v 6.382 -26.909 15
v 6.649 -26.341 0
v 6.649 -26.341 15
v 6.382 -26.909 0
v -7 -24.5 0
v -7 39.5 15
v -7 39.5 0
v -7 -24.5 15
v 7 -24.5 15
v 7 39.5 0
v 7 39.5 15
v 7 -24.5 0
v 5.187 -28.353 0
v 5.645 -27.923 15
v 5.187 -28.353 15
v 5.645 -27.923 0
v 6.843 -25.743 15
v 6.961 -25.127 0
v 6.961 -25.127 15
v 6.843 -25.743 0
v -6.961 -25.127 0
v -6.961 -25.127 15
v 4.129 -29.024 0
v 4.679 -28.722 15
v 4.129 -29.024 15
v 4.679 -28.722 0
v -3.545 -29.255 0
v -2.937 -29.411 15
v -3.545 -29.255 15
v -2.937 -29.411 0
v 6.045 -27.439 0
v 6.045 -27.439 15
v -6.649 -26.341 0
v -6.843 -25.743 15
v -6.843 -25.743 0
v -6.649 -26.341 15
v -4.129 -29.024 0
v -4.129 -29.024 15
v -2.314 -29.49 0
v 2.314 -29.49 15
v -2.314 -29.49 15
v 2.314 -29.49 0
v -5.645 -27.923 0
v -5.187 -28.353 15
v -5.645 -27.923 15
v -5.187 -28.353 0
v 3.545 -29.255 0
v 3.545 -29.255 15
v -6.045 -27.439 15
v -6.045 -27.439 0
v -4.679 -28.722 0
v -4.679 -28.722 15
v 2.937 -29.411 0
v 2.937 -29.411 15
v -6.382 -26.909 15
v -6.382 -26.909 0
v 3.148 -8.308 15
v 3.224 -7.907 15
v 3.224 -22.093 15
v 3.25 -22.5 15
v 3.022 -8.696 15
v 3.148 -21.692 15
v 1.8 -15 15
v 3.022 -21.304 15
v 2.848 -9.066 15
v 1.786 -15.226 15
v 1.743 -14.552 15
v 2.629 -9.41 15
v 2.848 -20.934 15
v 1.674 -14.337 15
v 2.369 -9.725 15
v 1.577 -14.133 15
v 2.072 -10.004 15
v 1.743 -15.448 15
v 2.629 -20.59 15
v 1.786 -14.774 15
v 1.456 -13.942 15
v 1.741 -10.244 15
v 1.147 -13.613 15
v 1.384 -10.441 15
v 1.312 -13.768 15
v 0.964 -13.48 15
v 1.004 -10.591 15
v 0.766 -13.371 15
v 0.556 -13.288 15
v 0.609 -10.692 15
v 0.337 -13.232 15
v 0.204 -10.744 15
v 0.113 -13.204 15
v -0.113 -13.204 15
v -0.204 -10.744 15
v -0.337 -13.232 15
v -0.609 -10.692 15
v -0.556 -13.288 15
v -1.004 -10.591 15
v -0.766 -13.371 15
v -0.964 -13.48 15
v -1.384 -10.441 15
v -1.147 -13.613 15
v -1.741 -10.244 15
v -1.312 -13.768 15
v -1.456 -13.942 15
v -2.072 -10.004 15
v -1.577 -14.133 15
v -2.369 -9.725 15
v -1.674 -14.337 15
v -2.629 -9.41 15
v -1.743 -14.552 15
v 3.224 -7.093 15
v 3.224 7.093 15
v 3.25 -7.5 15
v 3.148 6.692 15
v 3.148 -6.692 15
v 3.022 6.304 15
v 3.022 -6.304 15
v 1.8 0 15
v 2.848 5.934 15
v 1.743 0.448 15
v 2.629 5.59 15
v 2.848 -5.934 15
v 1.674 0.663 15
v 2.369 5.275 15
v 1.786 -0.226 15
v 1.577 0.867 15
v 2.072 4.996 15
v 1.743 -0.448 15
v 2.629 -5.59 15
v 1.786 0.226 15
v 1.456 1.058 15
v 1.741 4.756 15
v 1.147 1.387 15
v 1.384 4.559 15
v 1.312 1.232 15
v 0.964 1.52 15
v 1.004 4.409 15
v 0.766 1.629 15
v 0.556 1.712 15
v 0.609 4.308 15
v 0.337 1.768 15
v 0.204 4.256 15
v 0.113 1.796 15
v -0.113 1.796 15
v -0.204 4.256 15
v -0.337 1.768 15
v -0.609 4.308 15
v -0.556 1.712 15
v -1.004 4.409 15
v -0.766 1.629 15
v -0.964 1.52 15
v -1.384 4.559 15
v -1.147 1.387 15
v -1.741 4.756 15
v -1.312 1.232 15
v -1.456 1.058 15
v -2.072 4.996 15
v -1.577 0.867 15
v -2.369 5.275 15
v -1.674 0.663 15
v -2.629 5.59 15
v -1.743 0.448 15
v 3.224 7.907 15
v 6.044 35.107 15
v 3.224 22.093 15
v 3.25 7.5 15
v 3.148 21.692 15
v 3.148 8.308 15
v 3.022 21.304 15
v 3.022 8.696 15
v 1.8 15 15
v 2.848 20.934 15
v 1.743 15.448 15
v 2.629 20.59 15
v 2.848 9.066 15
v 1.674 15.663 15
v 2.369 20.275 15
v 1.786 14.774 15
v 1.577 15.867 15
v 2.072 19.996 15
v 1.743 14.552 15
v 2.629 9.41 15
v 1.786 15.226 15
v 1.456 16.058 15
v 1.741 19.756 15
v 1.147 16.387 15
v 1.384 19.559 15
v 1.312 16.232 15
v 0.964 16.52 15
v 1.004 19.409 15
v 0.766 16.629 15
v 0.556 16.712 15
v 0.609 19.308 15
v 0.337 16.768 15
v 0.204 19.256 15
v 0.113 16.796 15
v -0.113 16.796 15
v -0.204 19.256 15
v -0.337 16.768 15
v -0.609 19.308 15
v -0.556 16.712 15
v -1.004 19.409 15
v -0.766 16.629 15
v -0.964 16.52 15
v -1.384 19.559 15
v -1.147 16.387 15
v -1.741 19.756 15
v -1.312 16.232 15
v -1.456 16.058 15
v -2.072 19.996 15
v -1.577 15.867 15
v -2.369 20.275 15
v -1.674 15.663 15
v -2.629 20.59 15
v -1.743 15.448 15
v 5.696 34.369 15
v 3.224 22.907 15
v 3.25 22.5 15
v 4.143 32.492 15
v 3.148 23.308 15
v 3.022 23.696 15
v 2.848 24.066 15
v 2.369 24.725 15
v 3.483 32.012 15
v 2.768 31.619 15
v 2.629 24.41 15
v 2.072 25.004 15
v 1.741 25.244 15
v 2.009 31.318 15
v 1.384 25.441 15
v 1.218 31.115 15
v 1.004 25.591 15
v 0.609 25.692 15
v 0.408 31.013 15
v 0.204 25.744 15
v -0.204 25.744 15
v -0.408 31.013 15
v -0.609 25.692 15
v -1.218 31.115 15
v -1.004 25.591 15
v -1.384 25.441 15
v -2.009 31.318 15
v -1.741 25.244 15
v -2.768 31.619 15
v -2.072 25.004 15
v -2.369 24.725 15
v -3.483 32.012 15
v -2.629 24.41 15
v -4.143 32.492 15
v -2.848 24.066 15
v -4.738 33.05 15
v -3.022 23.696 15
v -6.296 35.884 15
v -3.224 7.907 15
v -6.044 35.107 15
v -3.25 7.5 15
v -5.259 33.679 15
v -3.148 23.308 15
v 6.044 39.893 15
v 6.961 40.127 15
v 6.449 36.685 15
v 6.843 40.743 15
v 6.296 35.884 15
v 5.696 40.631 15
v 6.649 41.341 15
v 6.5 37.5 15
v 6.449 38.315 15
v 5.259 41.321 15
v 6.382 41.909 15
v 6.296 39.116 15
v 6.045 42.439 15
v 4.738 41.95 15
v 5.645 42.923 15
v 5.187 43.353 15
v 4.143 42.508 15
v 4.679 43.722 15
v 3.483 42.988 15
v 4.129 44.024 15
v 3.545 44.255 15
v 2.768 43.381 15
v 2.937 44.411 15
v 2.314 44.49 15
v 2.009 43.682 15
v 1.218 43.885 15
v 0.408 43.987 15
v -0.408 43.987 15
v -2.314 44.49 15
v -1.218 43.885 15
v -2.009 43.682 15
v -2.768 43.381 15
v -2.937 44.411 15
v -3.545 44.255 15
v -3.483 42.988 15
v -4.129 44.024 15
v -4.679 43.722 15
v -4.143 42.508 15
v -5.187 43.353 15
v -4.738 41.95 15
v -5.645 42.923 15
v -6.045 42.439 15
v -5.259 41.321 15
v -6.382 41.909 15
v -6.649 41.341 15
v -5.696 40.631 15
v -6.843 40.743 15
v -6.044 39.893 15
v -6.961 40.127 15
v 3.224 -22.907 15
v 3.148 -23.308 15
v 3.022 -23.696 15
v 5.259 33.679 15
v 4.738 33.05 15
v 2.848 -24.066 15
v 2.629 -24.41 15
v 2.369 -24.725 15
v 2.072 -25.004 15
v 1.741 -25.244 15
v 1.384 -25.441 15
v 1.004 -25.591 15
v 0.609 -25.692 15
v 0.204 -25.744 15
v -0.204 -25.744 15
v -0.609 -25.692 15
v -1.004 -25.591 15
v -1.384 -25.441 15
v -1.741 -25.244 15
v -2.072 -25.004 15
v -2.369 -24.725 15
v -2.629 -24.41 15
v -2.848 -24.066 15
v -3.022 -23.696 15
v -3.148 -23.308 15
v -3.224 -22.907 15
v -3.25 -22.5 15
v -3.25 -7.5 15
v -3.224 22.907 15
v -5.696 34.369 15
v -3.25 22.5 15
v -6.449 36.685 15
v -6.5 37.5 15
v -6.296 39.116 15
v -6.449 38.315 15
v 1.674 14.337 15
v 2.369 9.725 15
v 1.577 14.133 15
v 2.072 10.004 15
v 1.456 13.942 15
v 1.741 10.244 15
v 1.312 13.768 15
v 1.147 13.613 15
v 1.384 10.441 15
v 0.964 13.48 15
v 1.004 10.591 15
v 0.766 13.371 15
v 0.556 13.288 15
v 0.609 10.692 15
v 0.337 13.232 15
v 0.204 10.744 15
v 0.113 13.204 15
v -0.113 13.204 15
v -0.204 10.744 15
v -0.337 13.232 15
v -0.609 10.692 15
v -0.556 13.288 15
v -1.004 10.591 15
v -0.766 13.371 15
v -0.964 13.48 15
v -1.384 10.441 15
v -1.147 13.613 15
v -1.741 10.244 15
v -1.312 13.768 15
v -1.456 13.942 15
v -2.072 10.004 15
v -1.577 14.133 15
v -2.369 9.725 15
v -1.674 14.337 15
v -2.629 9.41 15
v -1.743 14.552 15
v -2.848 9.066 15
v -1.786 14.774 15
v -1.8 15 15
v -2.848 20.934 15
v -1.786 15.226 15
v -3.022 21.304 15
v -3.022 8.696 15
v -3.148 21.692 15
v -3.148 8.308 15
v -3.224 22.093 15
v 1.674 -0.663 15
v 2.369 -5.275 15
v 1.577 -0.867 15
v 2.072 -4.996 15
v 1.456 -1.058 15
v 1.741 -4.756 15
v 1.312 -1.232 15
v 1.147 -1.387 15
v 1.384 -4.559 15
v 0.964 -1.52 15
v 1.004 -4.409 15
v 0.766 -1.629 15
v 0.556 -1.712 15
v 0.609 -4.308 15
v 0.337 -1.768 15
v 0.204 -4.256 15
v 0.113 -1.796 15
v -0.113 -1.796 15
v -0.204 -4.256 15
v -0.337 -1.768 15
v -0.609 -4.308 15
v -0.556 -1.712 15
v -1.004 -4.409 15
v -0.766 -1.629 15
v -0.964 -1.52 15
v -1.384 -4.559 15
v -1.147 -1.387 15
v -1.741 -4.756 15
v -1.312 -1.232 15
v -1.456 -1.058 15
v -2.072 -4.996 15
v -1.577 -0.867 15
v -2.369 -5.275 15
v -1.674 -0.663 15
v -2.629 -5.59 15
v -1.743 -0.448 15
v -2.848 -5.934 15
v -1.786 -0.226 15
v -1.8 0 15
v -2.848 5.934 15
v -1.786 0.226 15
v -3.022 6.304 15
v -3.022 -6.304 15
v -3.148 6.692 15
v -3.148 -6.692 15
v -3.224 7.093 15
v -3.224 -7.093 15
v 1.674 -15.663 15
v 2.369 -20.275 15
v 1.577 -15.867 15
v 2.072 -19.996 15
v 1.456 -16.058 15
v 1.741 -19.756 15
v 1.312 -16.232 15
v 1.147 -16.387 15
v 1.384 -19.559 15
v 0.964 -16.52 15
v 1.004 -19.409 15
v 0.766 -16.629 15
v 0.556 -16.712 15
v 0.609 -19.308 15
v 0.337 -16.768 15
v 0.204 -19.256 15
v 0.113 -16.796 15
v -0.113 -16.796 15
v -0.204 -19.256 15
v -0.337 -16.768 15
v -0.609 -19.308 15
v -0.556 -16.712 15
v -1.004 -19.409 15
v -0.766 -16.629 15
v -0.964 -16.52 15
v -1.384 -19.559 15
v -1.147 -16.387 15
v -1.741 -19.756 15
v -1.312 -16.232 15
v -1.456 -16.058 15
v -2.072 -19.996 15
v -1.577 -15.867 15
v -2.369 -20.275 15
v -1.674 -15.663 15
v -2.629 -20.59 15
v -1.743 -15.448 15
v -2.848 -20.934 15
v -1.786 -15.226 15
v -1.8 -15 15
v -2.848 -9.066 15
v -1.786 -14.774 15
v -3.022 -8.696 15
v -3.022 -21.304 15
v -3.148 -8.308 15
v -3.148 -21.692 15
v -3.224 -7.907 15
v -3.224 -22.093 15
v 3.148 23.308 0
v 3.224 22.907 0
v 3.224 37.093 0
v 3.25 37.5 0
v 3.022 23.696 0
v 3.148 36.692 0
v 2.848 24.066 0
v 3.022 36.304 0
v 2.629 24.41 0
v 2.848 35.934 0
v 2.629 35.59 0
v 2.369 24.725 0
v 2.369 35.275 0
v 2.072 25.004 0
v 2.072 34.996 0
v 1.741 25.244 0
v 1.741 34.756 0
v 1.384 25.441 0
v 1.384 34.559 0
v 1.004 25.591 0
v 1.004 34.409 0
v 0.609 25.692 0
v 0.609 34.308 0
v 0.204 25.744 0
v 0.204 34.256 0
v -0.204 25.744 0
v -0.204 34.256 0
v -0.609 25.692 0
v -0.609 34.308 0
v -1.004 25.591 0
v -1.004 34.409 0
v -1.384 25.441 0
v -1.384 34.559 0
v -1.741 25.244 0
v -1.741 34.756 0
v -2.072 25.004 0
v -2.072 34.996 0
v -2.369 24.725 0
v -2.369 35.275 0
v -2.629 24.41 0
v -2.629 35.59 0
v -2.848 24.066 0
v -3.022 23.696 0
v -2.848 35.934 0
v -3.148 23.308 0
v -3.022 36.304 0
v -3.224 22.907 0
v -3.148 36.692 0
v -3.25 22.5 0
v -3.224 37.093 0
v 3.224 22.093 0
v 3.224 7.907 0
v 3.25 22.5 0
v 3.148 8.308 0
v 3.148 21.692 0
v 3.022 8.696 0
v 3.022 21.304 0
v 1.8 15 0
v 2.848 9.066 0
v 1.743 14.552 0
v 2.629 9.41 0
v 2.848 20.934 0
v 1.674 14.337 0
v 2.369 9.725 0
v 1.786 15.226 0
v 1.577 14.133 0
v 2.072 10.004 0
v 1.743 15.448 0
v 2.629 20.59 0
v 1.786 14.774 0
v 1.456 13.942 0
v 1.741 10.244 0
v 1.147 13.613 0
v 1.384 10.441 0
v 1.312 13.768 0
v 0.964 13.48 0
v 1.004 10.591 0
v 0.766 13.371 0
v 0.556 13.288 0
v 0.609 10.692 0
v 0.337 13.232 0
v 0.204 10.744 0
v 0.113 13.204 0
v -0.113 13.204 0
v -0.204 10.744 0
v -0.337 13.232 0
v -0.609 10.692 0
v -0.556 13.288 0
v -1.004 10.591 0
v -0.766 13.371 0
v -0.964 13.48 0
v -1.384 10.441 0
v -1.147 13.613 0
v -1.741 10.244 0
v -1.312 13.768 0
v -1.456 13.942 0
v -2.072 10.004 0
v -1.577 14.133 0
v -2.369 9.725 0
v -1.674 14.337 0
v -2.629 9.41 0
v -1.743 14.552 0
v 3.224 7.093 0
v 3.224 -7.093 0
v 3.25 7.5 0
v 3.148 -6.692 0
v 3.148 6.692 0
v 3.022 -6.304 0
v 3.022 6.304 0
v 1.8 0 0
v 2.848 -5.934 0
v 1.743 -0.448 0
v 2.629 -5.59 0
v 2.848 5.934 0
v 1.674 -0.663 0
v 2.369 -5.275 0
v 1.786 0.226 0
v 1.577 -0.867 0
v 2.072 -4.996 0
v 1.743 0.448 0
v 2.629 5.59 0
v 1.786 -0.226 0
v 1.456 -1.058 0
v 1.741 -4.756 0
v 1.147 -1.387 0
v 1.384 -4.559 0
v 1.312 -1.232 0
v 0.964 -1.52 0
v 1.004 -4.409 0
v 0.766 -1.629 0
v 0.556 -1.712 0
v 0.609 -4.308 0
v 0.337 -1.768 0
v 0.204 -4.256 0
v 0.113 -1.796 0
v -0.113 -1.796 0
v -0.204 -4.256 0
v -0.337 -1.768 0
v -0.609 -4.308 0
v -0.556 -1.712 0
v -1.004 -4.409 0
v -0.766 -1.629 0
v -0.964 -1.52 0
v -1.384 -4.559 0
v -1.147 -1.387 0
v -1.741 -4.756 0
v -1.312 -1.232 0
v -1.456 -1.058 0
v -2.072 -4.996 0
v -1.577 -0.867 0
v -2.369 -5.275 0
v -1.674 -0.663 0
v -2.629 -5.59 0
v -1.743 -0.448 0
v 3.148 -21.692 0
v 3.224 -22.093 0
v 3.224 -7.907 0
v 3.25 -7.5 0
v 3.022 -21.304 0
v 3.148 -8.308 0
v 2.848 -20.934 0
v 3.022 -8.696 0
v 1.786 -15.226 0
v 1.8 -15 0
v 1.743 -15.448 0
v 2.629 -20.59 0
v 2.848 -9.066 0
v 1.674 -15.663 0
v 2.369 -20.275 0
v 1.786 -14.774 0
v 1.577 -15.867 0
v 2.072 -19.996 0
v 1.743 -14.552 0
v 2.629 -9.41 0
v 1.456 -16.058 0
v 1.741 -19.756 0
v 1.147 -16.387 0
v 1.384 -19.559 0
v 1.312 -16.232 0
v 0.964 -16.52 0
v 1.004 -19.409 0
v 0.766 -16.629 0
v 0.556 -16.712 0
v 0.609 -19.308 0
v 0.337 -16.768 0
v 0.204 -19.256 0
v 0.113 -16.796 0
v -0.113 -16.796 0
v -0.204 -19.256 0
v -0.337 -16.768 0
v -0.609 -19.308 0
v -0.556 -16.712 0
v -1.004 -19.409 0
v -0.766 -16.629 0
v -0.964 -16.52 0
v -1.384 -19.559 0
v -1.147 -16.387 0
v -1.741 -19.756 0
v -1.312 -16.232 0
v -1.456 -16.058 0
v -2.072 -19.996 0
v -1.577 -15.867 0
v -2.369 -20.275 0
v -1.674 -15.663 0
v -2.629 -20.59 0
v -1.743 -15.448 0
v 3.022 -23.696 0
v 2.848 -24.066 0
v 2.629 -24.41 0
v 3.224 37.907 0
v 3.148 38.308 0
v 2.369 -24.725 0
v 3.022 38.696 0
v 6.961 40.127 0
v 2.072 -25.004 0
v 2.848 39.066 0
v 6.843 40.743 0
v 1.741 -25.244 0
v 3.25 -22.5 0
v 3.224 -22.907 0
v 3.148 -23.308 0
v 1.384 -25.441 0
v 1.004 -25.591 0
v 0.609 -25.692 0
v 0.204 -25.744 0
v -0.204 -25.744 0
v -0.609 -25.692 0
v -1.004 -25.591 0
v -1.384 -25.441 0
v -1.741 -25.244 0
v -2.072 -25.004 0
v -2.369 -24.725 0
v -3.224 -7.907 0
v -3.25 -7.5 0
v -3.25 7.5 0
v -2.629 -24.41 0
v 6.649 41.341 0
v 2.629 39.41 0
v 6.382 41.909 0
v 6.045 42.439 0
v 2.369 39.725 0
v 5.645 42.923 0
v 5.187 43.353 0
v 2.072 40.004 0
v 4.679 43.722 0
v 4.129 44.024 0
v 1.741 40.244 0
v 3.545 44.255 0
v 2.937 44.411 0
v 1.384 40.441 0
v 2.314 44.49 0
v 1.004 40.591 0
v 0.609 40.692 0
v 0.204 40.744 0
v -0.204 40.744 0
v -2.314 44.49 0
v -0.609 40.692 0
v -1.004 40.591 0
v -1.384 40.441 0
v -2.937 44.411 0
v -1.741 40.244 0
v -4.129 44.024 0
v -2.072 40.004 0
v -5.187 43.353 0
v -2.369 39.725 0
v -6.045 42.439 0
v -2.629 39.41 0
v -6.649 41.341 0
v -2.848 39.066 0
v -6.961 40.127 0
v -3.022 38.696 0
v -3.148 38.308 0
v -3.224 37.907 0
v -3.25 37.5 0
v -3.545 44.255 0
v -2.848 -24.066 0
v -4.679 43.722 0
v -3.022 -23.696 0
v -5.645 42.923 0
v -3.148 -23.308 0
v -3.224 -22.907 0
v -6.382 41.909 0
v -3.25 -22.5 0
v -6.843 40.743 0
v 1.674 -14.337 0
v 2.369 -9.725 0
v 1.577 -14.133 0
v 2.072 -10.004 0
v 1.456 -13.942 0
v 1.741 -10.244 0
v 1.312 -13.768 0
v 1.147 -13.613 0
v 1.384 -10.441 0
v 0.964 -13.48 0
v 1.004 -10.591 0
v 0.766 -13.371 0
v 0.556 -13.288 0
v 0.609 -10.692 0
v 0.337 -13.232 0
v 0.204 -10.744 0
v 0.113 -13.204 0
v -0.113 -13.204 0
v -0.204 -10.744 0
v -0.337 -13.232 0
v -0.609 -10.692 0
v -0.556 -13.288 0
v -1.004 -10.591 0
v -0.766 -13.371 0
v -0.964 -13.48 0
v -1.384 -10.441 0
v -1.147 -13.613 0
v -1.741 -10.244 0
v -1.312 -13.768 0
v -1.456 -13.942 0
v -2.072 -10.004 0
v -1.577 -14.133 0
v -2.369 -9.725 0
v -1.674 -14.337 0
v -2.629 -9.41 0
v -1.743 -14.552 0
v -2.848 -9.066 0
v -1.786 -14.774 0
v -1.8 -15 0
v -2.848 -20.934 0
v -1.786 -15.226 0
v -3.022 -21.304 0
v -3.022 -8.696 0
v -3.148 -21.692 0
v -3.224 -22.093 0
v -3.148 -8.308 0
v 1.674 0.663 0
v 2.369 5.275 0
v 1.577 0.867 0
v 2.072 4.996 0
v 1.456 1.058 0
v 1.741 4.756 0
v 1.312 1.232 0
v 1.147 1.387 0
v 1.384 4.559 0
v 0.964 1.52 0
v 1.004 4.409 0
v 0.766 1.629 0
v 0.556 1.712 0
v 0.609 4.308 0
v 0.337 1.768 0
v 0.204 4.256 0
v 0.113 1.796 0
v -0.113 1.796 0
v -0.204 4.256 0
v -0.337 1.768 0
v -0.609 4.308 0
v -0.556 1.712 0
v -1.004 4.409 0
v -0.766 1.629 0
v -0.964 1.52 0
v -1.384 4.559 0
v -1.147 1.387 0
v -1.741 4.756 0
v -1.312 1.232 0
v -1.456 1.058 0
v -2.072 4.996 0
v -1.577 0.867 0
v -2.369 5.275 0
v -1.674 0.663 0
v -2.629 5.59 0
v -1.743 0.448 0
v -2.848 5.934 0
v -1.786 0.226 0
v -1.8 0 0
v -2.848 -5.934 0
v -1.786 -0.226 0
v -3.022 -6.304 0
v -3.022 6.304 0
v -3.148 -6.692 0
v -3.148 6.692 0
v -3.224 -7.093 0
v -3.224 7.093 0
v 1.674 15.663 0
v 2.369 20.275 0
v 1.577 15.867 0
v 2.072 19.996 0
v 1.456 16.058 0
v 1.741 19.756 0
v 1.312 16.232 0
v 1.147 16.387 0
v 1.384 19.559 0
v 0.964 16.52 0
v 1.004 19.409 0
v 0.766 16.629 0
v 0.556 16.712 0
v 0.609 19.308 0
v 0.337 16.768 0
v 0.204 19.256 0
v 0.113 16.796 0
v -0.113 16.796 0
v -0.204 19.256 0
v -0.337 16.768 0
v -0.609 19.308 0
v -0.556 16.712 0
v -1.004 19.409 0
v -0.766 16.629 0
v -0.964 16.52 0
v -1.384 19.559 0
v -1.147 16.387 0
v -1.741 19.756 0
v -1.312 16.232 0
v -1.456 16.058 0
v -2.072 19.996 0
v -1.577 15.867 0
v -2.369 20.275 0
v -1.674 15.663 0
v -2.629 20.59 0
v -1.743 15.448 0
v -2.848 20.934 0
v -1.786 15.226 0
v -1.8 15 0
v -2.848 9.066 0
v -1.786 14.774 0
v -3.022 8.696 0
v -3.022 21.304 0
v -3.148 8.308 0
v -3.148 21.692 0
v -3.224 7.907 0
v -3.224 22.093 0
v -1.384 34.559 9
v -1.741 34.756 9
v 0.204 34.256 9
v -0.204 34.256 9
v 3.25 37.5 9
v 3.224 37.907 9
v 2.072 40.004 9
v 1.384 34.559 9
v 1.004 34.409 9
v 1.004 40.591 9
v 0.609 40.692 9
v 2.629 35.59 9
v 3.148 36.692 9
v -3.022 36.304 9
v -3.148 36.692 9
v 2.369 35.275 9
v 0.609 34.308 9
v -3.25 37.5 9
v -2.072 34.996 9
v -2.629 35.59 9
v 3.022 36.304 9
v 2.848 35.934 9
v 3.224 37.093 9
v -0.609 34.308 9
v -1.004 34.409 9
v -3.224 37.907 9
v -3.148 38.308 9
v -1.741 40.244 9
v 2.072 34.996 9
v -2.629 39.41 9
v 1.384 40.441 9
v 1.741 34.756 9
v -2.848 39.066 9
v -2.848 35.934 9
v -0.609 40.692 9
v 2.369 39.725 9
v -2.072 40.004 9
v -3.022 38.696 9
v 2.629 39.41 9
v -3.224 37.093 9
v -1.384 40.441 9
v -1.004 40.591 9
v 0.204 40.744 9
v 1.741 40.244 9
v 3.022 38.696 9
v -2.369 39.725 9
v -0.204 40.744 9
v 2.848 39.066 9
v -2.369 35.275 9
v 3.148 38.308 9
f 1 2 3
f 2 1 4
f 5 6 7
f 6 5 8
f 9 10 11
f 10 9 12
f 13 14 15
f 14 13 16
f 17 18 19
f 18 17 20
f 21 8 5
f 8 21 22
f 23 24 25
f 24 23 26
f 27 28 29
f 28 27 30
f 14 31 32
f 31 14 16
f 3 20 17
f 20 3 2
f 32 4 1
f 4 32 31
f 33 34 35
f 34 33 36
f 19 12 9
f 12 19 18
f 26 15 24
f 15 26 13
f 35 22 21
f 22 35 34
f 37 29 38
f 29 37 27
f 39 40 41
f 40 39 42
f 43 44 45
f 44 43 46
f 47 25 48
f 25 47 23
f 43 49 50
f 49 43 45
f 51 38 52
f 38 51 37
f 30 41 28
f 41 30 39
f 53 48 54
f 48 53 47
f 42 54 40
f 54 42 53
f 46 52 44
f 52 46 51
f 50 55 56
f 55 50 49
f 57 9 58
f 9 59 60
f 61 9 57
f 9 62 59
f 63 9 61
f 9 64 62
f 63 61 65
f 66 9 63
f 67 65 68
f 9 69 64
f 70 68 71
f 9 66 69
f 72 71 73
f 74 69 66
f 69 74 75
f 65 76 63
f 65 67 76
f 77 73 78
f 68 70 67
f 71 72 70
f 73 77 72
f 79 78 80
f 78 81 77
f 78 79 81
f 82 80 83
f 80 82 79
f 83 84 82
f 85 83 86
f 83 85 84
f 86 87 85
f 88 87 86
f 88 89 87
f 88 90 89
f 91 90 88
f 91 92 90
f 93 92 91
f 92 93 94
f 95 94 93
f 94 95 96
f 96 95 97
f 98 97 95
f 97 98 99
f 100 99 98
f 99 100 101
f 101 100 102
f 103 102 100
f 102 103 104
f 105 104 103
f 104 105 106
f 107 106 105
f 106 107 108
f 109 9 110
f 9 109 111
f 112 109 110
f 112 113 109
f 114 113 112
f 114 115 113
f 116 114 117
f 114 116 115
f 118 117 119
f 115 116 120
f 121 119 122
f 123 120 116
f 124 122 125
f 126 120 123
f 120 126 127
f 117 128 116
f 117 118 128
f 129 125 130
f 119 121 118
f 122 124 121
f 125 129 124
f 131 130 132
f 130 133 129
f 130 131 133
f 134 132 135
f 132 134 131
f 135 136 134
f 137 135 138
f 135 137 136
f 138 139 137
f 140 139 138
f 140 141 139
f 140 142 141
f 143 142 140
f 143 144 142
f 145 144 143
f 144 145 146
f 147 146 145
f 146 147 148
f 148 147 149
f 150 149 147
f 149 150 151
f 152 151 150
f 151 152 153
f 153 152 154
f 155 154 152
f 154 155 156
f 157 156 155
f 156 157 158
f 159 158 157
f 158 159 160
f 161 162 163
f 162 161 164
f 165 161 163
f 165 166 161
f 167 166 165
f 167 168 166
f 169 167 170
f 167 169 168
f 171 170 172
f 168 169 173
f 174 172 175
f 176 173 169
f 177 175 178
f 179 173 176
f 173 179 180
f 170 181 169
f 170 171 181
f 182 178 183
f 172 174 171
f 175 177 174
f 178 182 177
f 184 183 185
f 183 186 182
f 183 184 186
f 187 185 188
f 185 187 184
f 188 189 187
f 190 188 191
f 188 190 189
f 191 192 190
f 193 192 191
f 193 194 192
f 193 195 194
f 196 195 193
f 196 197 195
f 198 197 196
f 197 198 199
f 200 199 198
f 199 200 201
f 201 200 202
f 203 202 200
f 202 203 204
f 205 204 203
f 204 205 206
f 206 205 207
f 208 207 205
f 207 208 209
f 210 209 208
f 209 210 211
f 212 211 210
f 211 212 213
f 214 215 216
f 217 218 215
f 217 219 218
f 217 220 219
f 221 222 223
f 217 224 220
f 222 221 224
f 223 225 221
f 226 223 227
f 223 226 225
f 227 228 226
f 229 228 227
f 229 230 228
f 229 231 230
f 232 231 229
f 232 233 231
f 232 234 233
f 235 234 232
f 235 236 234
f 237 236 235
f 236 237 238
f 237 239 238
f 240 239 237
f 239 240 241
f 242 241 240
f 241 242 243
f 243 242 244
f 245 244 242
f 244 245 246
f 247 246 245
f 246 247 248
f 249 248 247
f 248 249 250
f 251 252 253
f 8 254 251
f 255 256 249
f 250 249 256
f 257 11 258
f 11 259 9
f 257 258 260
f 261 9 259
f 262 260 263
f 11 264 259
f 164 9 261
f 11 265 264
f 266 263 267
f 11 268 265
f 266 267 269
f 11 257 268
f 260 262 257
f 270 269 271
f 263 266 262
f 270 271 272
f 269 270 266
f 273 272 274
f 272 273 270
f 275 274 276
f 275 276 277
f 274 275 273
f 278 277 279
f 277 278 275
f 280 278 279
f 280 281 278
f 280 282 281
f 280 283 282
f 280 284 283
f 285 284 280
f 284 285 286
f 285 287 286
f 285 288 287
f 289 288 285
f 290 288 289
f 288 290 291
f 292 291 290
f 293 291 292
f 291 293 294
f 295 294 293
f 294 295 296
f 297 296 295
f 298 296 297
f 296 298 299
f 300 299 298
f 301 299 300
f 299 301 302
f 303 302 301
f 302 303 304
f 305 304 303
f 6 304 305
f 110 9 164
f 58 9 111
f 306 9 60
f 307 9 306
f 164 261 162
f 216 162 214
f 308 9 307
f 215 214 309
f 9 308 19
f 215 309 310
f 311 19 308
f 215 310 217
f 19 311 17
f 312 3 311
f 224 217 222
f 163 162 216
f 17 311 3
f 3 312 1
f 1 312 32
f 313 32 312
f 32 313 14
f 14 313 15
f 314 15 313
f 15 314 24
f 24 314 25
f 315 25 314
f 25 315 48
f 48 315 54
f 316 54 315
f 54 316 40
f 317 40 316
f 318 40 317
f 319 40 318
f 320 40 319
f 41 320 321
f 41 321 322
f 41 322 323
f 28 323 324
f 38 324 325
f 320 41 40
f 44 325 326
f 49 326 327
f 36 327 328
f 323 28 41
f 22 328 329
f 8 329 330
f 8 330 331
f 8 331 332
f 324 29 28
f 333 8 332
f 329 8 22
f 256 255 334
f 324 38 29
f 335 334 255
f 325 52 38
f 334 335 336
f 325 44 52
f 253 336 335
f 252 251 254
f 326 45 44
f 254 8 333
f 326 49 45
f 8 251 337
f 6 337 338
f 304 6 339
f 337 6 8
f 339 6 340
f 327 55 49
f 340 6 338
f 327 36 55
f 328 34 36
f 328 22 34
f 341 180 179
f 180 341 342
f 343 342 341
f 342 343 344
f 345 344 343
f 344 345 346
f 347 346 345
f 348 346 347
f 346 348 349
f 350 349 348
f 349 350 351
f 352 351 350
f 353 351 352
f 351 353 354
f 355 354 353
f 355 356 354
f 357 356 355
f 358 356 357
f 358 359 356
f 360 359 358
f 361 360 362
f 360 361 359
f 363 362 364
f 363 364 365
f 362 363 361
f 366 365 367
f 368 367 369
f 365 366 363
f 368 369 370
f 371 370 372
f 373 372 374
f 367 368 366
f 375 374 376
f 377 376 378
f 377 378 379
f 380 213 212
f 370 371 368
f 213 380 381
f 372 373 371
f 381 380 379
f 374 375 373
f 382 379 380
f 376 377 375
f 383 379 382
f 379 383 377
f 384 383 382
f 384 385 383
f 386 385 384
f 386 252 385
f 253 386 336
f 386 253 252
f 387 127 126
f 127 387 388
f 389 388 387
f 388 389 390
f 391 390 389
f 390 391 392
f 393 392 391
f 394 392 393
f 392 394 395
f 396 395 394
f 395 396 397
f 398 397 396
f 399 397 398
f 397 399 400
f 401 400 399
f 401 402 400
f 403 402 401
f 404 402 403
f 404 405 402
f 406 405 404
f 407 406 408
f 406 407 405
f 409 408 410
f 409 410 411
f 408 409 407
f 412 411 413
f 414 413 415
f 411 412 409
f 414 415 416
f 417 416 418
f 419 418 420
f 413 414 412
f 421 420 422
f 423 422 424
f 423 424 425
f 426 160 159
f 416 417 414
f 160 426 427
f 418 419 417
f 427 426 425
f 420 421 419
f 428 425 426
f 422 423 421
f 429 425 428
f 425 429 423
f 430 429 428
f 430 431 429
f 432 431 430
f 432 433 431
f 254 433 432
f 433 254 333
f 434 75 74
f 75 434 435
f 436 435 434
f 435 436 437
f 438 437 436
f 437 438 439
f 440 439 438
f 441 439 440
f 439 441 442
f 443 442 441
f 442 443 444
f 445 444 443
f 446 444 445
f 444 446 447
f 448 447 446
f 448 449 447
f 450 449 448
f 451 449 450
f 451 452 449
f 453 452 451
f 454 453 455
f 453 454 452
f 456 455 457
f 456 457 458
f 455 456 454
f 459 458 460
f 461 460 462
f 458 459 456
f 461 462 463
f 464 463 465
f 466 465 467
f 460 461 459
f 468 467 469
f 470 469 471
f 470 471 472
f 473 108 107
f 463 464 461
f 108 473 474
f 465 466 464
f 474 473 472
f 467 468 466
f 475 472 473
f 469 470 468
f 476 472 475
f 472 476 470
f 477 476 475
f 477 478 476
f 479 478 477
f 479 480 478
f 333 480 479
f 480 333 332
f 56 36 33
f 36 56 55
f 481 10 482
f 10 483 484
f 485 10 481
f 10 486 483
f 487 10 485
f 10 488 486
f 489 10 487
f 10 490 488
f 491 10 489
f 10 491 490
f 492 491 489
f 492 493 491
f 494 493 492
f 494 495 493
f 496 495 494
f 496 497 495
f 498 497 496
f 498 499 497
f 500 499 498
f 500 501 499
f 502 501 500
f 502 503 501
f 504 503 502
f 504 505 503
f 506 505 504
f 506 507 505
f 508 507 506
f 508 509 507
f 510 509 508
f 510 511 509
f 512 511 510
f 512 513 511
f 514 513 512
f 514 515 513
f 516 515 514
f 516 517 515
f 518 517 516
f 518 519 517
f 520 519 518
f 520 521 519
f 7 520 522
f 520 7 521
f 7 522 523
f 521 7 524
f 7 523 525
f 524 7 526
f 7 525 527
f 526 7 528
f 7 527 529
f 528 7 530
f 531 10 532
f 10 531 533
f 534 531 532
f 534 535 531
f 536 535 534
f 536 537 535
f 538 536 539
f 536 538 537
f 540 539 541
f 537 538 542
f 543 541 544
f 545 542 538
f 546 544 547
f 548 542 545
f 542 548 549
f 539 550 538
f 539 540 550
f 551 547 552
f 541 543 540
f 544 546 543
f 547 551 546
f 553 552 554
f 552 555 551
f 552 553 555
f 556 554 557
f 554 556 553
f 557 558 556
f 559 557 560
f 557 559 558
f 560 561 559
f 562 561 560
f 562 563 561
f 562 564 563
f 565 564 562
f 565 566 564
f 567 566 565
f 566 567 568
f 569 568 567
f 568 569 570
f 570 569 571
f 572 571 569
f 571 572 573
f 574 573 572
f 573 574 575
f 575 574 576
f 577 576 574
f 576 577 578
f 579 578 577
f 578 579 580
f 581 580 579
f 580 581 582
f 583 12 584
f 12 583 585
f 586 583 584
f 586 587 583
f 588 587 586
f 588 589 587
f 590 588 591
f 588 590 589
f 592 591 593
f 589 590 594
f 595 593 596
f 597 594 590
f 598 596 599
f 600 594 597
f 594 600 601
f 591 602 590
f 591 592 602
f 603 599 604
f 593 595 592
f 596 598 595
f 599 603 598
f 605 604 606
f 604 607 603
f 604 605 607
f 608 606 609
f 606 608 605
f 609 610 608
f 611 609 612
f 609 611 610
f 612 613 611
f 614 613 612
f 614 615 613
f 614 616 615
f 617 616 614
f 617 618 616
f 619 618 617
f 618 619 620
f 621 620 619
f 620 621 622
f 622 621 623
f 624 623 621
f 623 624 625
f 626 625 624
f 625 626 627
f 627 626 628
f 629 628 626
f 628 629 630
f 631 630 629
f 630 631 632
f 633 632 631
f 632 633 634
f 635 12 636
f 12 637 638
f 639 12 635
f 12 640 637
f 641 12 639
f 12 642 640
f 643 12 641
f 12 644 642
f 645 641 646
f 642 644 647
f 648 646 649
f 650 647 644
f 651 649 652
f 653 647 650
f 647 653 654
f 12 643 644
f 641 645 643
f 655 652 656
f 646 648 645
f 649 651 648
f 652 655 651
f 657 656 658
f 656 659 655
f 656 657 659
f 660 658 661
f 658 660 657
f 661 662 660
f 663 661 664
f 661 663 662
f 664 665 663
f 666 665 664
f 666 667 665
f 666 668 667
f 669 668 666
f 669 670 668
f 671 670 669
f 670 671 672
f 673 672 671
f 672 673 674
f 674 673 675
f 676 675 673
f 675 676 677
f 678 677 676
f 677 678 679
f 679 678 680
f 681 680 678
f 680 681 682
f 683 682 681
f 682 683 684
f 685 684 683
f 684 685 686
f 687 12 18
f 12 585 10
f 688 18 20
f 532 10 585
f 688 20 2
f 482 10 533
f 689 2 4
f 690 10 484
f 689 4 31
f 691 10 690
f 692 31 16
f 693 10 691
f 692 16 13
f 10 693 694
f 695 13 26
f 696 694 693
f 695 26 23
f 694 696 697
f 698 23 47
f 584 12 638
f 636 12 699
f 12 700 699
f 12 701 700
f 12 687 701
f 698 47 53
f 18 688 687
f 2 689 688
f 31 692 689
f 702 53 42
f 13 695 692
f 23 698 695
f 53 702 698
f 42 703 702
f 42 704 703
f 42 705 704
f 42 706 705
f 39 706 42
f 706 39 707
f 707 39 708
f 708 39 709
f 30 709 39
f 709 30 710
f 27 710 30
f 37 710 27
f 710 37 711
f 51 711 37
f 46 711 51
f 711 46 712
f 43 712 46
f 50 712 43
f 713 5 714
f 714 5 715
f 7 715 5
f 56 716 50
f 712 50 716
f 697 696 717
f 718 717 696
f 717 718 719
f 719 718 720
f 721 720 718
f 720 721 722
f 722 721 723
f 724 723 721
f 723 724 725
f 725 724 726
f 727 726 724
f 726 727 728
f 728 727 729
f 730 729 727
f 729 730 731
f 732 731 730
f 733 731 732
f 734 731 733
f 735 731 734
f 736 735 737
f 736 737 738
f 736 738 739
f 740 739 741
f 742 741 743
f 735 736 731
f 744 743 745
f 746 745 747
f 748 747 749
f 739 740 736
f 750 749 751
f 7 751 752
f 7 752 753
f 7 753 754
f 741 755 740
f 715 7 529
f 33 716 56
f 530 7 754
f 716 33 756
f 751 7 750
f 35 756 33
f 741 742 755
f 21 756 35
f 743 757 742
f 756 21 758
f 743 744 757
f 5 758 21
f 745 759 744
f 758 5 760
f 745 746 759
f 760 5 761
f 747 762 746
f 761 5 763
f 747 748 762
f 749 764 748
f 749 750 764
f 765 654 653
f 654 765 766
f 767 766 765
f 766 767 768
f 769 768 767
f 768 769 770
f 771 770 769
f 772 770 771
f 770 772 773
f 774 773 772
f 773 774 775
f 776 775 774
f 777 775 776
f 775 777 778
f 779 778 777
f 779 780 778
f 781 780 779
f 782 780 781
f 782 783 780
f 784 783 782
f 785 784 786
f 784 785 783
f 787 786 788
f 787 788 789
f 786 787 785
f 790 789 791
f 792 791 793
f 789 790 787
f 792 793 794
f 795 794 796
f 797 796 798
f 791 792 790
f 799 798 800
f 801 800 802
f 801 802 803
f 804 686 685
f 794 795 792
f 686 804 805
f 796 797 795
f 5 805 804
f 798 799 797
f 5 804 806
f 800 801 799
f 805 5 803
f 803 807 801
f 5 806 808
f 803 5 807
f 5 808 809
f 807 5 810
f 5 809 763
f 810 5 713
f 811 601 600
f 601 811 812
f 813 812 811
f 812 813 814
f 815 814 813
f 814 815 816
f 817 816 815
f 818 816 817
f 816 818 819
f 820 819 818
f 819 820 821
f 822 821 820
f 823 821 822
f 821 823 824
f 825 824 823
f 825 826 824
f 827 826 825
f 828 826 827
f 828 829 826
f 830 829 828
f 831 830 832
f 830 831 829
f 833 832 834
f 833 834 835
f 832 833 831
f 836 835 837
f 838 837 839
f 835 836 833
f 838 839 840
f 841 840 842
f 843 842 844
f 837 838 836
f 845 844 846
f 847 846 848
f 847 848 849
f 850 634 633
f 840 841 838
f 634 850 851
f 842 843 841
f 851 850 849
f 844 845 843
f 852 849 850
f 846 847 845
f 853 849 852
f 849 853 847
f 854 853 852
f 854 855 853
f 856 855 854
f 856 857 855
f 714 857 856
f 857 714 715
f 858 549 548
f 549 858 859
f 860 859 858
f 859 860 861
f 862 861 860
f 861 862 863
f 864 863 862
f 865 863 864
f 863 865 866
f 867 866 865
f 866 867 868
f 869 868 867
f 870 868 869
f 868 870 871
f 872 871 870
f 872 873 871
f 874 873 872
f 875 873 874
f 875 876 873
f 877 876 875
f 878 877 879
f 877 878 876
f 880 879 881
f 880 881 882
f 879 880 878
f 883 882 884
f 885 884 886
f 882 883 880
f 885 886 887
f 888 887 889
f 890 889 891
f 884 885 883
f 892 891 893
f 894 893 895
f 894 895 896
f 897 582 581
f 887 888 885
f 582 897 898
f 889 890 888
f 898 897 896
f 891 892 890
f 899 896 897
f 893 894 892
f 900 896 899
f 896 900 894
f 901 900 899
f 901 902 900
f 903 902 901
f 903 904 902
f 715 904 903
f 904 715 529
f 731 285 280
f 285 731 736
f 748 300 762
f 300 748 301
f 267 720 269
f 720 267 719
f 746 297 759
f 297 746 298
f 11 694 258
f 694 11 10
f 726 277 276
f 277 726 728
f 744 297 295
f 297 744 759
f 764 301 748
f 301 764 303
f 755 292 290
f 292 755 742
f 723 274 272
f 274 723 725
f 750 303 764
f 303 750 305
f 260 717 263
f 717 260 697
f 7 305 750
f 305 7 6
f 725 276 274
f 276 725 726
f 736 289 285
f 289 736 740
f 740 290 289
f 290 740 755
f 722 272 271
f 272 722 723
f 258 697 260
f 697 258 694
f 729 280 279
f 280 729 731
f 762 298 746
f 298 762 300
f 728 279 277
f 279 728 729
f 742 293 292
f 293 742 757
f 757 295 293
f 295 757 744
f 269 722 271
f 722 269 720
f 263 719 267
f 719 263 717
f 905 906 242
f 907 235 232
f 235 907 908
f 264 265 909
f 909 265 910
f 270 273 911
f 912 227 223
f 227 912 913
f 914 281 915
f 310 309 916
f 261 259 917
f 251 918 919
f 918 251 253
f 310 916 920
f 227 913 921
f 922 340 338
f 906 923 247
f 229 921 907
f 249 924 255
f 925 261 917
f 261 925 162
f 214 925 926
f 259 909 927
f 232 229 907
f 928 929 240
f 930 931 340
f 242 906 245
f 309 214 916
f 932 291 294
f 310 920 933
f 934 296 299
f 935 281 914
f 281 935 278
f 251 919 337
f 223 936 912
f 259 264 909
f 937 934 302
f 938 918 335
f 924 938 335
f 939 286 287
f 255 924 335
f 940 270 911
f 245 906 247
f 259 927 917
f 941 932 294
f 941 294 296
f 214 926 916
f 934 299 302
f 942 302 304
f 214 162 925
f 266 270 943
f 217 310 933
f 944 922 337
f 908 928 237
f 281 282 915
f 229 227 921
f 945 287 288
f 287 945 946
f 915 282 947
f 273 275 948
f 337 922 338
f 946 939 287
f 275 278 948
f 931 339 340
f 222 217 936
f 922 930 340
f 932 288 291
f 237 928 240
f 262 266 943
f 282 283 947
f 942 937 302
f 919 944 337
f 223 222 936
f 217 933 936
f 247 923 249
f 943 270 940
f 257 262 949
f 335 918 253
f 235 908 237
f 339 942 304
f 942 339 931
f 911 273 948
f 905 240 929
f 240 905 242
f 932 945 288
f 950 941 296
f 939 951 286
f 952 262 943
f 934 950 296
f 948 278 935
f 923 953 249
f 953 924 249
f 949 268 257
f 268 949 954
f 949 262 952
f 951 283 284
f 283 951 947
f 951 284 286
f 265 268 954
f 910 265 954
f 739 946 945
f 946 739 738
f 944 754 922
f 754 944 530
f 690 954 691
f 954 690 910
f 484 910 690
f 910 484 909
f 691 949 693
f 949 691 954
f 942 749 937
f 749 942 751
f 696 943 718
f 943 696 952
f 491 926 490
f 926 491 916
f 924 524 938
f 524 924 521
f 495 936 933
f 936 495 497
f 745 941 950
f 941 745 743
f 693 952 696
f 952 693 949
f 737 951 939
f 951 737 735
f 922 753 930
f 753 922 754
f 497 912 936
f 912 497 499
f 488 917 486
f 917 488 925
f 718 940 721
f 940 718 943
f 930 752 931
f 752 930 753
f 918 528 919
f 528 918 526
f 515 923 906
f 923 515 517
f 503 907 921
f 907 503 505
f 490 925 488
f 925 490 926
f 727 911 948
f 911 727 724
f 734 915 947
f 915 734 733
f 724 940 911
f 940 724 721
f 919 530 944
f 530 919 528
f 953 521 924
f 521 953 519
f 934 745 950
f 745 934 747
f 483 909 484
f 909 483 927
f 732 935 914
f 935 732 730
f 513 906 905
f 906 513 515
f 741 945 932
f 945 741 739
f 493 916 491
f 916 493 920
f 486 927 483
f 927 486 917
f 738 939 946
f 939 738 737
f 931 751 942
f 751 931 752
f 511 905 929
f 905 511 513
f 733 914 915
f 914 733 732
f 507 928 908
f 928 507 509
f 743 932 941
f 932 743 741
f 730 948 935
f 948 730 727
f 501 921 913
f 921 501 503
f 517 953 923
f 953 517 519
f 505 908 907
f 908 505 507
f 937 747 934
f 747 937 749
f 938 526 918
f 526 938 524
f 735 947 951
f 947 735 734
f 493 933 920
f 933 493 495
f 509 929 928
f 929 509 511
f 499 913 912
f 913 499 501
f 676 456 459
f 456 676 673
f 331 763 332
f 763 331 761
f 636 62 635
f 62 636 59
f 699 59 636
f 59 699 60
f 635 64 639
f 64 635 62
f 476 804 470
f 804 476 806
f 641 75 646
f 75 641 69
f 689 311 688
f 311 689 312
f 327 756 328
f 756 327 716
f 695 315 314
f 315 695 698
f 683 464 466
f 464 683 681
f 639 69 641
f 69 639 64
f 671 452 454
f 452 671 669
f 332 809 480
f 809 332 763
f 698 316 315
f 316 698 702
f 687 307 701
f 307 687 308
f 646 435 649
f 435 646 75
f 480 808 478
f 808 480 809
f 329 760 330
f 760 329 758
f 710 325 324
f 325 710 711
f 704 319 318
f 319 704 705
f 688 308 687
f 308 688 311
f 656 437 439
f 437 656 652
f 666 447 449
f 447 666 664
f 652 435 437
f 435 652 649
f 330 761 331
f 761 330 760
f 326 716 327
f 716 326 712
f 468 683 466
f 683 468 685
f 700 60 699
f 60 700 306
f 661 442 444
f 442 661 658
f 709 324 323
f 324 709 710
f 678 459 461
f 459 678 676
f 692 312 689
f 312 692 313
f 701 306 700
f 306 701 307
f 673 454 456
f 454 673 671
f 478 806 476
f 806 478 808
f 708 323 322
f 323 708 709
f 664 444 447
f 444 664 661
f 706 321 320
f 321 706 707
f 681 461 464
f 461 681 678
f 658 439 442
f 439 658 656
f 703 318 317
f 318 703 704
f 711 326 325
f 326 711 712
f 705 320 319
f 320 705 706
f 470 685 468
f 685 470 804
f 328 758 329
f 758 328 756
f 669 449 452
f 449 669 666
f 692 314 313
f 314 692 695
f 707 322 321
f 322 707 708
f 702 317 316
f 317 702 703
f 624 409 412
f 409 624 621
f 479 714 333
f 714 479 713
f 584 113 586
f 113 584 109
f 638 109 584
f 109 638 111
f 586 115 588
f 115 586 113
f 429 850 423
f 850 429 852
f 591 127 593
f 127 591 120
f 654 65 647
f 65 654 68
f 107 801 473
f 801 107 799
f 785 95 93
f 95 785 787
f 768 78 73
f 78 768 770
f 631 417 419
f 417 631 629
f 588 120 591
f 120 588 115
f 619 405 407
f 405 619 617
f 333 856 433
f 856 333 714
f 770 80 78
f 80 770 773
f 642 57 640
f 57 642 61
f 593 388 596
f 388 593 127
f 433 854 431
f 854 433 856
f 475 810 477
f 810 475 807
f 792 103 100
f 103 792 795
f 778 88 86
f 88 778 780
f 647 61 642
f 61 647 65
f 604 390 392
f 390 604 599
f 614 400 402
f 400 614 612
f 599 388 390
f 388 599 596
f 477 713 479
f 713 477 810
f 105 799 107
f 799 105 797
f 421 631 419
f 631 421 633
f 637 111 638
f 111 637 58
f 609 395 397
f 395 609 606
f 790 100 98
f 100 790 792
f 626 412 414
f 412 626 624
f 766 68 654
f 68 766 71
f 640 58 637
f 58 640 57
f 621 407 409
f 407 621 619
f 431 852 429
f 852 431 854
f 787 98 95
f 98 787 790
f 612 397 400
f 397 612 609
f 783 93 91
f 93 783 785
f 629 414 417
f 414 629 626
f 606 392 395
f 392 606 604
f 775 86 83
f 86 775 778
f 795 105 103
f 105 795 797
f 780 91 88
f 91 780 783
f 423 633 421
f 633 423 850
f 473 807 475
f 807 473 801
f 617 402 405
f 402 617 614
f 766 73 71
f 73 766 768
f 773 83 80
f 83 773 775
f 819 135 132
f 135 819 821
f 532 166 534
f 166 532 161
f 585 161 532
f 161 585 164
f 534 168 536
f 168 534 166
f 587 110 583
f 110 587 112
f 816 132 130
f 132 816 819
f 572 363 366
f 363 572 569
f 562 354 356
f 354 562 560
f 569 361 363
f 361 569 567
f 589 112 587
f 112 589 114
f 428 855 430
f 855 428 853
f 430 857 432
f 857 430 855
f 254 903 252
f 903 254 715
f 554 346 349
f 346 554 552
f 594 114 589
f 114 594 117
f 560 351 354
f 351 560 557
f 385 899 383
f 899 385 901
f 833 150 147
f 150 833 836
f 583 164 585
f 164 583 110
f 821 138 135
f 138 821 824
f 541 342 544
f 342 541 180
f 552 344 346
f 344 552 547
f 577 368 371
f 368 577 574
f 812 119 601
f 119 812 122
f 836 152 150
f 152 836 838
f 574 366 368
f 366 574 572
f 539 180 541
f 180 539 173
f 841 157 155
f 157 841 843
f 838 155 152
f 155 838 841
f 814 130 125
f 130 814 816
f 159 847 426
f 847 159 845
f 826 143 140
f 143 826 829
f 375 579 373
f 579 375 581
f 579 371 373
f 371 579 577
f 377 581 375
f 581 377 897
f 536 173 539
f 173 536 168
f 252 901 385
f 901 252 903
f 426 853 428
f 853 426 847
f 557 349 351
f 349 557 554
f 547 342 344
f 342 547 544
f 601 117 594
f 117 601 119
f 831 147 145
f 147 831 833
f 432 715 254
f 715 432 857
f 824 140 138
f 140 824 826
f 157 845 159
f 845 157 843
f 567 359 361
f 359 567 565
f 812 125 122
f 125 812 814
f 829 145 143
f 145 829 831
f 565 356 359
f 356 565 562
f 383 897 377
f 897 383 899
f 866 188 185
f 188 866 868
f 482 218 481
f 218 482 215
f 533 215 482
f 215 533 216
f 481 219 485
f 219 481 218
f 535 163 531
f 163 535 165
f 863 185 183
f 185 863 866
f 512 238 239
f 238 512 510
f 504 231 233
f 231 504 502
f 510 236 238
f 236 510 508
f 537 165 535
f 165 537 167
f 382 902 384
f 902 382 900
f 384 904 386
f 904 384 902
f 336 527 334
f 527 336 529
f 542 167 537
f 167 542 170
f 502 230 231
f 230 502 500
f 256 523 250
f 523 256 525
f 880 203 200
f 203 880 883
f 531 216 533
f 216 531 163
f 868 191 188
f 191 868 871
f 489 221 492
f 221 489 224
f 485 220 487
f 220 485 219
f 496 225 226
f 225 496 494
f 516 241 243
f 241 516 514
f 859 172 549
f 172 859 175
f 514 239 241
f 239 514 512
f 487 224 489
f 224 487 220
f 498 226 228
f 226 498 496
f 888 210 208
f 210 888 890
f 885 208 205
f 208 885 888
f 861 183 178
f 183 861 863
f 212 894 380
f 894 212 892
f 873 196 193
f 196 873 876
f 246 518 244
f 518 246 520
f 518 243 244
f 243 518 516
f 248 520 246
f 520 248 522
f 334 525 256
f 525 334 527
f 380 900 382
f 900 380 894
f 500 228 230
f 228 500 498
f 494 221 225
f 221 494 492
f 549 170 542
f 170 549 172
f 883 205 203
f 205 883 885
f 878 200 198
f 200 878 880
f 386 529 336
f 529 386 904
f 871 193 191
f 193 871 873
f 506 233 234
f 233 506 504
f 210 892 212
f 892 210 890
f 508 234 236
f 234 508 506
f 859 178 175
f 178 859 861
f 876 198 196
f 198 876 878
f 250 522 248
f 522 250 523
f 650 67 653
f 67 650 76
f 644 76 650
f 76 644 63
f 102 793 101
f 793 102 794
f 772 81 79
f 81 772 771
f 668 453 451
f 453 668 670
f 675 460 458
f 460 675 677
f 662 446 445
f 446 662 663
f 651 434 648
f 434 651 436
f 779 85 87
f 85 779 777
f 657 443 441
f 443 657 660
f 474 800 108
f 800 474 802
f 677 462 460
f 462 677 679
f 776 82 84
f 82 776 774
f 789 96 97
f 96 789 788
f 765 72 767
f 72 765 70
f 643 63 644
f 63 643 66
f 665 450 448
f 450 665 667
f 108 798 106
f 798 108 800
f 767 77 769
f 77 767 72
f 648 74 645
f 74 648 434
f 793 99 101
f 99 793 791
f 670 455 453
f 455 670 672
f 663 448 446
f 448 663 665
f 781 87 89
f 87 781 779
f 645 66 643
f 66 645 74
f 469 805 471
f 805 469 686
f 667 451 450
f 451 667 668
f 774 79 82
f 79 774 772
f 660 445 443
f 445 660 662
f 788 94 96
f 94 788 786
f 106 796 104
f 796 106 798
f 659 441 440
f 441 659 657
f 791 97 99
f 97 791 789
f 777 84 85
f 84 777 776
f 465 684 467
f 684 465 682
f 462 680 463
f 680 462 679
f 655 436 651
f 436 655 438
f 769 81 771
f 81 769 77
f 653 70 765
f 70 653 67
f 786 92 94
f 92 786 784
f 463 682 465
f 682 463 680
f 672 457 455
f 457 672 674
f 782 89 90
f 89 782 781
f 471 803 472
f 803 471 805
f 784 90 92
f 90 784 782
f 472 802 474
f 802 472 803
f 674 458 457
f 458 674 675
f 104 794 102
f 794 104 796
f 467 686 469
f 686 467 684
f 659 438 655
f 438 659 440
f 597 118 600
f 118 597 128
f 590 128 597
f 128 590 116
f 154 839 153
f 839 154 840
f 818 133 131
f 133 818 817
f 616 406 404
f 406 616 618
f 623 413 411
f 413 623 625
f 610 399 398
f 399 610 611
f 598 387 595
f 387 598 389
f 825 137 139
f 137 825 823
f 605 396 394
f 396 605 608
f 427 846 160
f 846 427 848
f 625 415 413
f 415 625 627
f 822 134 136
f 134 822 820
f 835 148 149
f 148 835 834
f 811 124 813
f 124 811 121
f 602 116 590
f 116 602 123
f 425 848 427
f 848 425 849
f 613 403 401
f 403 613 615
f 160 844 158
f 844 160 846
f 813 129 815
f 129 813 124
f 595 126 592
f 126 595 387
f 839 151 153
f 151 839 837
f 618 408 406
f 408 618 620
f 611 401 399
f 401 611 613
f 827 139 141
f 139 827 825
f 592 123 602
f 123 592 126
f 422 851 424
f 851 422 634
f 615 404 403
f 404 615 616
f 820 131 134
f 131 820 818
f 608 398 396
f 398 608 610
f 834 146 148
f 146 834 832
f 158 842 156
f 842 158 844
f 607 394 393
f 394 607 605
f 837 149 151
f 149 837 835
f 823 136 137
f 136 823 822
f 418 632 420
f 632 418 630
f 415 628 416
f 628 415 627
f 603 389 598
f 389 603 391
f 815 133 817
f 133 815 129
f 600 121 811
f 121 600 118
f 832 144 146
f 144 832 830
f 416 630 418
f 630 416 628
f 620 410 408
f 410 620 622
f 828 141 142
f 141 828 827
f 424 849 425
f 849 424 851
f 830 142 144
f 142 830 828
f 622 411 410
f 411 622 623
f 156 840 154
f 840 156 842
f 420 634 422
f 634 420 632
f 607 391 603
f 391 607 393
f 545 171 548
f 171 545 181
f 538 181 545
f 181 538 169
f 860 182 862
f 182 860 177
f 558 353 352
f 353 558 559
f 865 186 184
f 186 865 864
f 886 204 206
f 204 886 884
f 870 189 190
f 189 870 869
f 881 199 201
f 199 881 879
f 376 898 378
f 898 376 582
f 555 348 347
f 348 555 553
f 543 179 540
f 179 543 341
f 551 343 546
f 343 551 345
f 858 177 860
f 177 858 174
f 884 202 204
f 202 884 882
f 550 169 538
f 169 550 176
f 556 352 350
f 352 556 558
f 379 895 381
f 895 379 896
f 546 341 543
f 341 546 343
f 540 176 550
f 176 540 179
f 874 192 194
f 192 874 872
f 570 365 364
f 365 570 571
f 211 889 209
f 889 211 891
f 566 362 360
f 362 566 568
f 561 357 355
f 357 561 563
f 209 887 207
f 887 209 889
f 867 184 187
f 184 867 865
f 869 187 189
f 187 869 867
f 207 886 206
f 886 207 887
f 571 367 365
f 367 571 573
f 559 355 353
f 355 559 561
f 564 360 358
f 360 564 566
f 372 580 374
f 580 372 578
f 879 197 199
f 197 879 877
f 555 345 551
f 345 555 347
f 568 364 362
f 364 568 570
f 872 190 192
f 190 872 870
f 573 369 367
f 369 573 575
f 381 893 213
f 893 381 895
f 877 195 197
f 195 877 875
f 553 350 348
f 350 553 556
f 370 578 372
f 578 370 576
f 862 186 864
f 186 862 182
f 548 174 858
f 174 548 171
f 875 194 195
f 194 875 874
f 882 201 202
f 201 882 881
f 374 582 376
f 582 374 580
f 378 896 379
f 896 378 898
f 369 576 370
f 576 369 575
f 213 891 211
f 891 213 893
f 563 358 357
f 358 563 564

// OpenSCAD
$fn = 50;


difference() {
	union() {
		hull() {
			translate(v = [-2.0000000000, 24.5000000000, 0]) {
				cylinder(h = 15, r = 5);
			}
			translate(v = [2.0000000000, 24.5000000000, 0]) {
				cylinder(h = 15, r = 5);
			}
			translate(v = [-2.0000000000, -24.5000000000, 0]) {
				cylinder(h = 15, r = 5);
			}
			translate(v = [2.0000000000, -24.5000000000, 0]) {
				cylinder(h = 15, r = 5);
			}
		}
		translate(v = [0.0000000000, 30.0000000000, 0]) {
			hull() {
				translate(v = [-2.0000000000, 9.5000000000, 0]) {
					cylinder(h = 15, r = 5);
				}
				translate(v = [2.0000000000, 9.5000000000, 0]) {
					cylinder(h = 15, r = 5);
				}
				translate(v = [-2.0000000000, -9.5000000000, 0]) {
					cylinder(h = 15, r = 5);
				}
				translate(v = [2.0000000000, -9.5000000000, 0]) {
					cylinder(h = 15, r = 5);
				}
			}
		}
		translate(v = [0.0000000000, 30.0000000000, 0]) {
			hull() {
				translate(v = [-2.0000000000, 9.5000000000, 0]) {
					cylinder(h = 15, r = 5);
				}
				translate(v = [2.0000000000, 9.5000000000, 0]) {
					cylinder(h = 15, r = 5);
				}
				translate(v = [-2.0000000000, -9.5000000000, 0]) {
					cylinder(h = 15, r = 5);
				}
				translate(v = [2.0000000000, -9.5000000000, 0]) {
					cylinder(h = 15, r = 5);
				}
			}
		}
	}
	union() {
		translate(v = [0.0000000000, 37.5000000000, 15]) {
			rotate(a = [0, 0, 0]) {
				difference() {
					union() {
						#translate(v = [0, 0, -15.0000000000]) {
							cylinder(h = 15, r = 2.2500000000);
						}
						#translate(v = [0, 0, -6]) {
							cylinder(h = 6, r1 = 3.2500000000, r2 = 6.5000000000);
						}
						#translate(v = [0, 0, -15.0000000000]) {
							cylinder(h = 15, r = 3.2500000000);
						}
						#translate(v = [0, 0, -15.0000000000]) {
							cylinder(h = 15, r = 2.2500000000);
						}
					}
					union();
				}
			}
		}
		translate(v = [0.0000000000, 37.5000000000, 15]) {
			rotate(a = [0, 0, 0]) {
				difference() {
					union() {
						#translate(v = [0, 0, -15.0000000000]) {
							cylinder(h = 15, r = 2.2500000000);
						}
						#translate(v = [0, 0, -6]) {
							cylinder(h = 6, r1 = 3.2500000000, r2 = 6.5000000000);
						}
						#translate(v = [0, 0, -15.0000000000]) {
							cylinder(h = 15, r = 3.2500000000);
						}
						#translate(v = [0, 0, -15.0000000000]) {
							cylinder(h = 15, r = 2.2500000000);
						}
					}
					union();
				}
			}
		}
		translate(v = [0.0000000000, -22.5000000000, 0]) {
			translate(v = [0, 0, -100]) {
				cylinder(h = 200, r = 3.2500000000);
			}
		}
		translate(v = [0.0000000000, -7.5000000000, 0]) {
			translate(v = [0, 0, -100]) {
				cylinder(h = 200, r = 3.2500000000);
			}
		}
		translate(v = [0.0000000000, 7.5000000000, 0]) {
			translate(v = [0, 0, -100]) {
				cylinder(h = 200, r = 3.2500000000);
			}
		}
		translate(v = [0.0000000000, 22.5000000000, 0]) {
			translate(v = [0, 0, -100]) {
				cylinder(h = 200, r = 3.2500000000);
			}
		}
		translate(v = [0.0000000000, -22.5000000000, 0]) {
			translate(v = [0, 0, -100]) {
				cylinder(h = 200, r = 1.8000000000);
			}
		}
		translate(v = [0.0000000000, -15.0000000000, 0]) {
			translate(v = [0, 0, -100]) {
				cylinder(h = 200, r = 1.8000000000);
			}
		}
		translate(v = [0.0000000000, -7.5000000000, 0]) {
			translate(v = [0, 0, -100]) {
				cylinder(h = 200, r = 1.8000000000);
			}
		}
		translate(v = [0, 0, -100]) {
			cylinder(h = 200, r = 1.8000000000);
		}
		translate(v = [0.0000000000, 7.5000000000, 0]) {
			translate(v = [0, 0, -100]) {
				cylinder(h = 200, r = 1.8000000000);
			}
		}
		translate(v = [0.0000000000, 15.0000000000, 0]) {
			translate(v = [0, 0, -100]) {
				cylinder(h = 200, r = 1.8000000000);
			}
		}
		translate(v = [0.0000000000, 22.5000000000, 0]) {
			translate(v = [0, 0, -100]) {
				cylinder(h = 200, r = 1.8000000000);
			}
		}
	}
}
